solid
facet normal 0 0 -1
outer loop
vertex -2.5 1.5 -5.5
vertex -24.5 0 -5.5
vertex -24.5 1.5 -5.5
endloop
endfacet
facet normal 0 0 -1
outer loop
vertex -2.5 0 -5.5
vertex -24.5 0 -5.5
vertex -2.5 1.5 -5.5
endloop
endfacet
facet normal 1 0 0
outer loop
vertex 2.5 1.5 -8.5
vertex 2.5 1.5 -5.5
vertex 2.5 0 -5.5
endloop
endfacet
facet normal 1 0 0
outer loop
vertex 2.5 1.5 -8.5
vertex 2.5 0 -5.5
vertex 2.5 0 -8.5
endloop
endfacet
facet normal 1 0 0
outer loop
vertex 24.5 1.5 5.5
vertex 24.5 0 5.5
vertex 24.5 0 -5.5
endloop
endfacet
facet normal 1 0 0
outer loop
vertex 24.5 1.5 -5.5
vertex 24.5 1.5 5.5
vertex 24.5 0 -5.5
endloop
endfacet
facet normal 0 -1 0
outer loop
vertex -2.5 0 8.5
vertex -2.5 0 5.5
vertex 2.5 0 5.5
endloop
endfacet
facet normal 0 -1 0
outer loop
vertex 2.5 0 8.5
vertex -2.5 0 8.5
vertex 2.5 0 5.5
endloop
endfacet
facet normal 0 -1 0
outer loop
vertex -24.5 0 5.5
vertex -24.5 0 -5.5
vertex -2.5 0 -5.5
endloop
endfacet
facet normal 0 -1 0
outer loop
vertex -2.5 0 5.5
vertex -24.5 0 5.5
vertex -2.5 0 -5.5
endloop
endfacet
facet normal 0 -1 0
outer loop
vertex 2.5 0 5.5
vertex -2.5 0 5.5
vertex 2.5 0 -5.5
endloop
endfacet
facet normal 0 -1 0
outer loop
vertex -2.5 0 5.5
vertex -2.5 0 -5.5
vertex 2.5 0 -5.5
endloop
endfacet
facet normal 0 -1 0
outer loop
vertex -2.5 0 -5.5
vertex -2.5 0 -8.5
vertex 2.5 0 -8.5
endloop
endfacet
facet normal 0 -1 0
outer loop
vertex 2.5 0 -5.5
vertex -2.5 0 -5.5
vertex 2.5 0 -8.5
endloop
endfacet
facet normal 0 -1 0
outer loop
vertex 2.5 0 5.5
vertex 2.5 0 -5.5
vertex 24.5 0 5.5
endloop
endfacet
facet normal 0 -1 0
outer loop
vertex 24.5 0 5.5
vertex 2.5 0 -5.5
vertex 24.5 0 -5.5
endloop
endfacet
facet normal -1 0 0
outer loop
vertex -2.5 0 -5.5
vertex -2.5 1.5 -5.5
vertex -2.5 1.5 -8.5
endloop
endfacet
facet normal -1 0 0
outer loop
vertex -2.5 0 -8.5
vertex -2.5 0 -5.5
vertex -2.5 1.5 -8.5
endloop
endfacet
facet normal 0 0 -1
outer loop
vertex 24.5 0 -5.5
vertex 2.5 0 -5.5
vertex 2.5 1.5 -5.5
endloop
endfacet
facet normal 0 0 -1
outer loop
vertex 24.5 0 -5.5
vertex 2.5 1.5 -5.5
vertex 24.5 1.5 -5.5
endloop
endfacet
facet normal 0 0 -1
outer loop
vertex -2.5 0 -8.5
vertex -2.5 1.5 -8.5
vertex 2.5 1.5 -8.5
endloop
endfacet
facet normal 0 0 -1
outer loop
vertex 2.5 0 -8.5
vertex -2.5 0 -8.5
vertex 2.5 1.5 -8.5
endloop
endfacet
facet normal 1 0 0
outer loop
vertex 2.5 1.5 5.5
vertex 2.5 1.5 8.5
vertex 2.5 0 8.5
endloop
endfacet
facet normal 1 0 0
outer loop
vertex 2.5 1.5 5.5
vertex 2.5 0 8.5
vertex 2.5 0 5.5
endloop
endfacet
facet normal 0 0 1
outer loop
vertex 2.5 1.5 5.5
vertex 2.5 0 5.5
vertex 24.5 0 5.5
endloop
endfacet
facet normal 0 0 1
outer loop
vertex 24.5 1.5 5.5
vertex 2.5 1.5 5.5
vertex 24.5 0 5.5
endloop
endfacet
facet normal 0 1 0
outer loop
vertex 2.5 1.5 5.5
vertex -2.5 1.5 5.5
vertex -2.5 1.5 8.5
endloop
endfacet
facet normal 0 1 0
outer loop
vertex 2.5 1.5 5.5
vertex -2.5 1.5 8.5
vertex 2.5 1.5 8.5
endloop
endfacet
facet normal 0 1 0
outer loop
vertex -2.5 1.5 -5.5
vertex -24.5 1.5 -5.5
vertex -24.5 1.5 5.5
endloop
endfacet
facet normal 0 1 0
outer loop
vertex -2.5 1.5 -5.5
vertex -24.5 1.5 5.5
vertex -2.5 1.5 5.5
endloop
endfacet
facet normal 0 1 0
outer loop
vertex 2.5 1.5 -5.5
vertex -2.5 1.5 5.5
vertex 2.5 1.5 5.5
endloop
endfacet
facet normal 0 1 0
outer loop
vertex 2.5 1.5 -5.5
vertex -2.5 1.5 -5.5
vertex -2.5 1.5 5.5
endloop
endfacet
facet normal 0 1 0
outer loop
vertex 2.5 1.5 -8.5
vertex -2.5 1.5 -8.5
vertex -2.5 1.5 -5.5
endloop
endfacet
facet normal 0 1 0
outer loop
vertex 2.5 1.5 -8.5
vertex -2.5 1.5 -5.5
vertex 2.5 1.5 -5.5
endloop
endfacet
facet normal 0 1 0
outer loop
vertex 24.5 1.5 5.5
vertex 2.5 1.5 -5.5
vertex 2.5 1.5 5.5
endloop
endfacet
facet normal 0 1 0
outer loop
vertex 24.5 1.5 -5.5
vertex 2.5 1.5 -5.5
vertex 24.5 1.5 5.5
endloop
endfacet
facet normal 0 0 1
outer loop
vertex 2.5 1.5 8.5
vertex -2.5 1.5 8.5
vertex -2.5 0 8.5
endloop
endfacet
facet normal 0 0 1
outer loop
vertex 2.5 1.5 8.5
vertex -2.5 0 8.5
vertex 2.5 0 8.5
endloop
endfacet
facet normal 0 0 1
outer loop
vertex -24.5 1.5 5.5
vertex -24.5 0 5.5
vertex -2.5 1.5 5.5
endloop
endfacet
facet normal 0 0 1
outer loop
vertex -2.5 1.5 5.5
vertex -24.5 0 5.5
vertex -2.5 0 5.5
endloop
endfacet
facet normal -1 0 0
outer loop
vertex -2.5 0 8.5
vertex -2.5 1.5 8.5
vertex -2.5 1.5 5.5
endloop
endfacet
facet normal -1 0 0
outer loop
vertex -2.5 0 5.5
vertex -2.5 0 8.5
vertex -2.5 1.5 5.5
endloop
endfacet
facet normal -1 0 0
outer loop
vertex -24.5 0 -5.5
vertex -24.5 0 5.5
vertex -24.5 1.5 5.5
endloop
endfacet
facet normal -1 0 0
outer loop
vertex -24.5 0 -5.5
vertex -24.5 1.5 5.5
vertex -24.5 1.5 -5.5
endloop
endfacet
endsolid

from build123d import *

# Parameters (mm, degrees)
SKETCH1_W           = 49
SKETCH1_H           = 11
BOSS_EXTRUDE1_DEPTH = 1.5
SKETCH2_W           = 5
SKETCH2_H           = 3
BOSS_EXTRUDE2_DEPTH = 1.5
SKETCH3_W           = 5
SKETCH3_H           = 3
BOSS_EXTRUDE3_DEPTH = 1.5


with BuildPart() as part:
    # Sketch1 → Boss-Extrude1 (new body)
    with BuildSketch(Plane(origin=(0, 0, 0), x_dir=(1, 0, 0), z_dir=(0, 1, 0))):
        Rectangle(SKETCH1_W, SKETCH1_H)
    extrude(amount=BOSS_EXTRUDE1_DEPTH)

    # Sketch2 → Boss-Extrude2 (add)
    with BuildSketch(Plane(origin=(0, 1.5, 0), x_dir=(1, 0, 0), z_dir=(0, 1, 0))):
        with Locations((0, 7)):
            Rectangle(SKETCH2_W, SKETCH2_H)
    extrude(amount=-BOSS_EXTRUDE2_DEPTH)

    # Sketch3 → Boss-Extrude3 (add)
    with BuildSketch(Plane(origin=(0, 1.5, 0), x_dir=(1, 0, 0), z_dir=(0, 1, 0))):
        with Locations((0, -7)):
            Rectangle(SKETCH3_W, SKETCH3_H)
    extrude(amount=-BOSS_EXTRUDE3_DEPTH)


solid = part.part
